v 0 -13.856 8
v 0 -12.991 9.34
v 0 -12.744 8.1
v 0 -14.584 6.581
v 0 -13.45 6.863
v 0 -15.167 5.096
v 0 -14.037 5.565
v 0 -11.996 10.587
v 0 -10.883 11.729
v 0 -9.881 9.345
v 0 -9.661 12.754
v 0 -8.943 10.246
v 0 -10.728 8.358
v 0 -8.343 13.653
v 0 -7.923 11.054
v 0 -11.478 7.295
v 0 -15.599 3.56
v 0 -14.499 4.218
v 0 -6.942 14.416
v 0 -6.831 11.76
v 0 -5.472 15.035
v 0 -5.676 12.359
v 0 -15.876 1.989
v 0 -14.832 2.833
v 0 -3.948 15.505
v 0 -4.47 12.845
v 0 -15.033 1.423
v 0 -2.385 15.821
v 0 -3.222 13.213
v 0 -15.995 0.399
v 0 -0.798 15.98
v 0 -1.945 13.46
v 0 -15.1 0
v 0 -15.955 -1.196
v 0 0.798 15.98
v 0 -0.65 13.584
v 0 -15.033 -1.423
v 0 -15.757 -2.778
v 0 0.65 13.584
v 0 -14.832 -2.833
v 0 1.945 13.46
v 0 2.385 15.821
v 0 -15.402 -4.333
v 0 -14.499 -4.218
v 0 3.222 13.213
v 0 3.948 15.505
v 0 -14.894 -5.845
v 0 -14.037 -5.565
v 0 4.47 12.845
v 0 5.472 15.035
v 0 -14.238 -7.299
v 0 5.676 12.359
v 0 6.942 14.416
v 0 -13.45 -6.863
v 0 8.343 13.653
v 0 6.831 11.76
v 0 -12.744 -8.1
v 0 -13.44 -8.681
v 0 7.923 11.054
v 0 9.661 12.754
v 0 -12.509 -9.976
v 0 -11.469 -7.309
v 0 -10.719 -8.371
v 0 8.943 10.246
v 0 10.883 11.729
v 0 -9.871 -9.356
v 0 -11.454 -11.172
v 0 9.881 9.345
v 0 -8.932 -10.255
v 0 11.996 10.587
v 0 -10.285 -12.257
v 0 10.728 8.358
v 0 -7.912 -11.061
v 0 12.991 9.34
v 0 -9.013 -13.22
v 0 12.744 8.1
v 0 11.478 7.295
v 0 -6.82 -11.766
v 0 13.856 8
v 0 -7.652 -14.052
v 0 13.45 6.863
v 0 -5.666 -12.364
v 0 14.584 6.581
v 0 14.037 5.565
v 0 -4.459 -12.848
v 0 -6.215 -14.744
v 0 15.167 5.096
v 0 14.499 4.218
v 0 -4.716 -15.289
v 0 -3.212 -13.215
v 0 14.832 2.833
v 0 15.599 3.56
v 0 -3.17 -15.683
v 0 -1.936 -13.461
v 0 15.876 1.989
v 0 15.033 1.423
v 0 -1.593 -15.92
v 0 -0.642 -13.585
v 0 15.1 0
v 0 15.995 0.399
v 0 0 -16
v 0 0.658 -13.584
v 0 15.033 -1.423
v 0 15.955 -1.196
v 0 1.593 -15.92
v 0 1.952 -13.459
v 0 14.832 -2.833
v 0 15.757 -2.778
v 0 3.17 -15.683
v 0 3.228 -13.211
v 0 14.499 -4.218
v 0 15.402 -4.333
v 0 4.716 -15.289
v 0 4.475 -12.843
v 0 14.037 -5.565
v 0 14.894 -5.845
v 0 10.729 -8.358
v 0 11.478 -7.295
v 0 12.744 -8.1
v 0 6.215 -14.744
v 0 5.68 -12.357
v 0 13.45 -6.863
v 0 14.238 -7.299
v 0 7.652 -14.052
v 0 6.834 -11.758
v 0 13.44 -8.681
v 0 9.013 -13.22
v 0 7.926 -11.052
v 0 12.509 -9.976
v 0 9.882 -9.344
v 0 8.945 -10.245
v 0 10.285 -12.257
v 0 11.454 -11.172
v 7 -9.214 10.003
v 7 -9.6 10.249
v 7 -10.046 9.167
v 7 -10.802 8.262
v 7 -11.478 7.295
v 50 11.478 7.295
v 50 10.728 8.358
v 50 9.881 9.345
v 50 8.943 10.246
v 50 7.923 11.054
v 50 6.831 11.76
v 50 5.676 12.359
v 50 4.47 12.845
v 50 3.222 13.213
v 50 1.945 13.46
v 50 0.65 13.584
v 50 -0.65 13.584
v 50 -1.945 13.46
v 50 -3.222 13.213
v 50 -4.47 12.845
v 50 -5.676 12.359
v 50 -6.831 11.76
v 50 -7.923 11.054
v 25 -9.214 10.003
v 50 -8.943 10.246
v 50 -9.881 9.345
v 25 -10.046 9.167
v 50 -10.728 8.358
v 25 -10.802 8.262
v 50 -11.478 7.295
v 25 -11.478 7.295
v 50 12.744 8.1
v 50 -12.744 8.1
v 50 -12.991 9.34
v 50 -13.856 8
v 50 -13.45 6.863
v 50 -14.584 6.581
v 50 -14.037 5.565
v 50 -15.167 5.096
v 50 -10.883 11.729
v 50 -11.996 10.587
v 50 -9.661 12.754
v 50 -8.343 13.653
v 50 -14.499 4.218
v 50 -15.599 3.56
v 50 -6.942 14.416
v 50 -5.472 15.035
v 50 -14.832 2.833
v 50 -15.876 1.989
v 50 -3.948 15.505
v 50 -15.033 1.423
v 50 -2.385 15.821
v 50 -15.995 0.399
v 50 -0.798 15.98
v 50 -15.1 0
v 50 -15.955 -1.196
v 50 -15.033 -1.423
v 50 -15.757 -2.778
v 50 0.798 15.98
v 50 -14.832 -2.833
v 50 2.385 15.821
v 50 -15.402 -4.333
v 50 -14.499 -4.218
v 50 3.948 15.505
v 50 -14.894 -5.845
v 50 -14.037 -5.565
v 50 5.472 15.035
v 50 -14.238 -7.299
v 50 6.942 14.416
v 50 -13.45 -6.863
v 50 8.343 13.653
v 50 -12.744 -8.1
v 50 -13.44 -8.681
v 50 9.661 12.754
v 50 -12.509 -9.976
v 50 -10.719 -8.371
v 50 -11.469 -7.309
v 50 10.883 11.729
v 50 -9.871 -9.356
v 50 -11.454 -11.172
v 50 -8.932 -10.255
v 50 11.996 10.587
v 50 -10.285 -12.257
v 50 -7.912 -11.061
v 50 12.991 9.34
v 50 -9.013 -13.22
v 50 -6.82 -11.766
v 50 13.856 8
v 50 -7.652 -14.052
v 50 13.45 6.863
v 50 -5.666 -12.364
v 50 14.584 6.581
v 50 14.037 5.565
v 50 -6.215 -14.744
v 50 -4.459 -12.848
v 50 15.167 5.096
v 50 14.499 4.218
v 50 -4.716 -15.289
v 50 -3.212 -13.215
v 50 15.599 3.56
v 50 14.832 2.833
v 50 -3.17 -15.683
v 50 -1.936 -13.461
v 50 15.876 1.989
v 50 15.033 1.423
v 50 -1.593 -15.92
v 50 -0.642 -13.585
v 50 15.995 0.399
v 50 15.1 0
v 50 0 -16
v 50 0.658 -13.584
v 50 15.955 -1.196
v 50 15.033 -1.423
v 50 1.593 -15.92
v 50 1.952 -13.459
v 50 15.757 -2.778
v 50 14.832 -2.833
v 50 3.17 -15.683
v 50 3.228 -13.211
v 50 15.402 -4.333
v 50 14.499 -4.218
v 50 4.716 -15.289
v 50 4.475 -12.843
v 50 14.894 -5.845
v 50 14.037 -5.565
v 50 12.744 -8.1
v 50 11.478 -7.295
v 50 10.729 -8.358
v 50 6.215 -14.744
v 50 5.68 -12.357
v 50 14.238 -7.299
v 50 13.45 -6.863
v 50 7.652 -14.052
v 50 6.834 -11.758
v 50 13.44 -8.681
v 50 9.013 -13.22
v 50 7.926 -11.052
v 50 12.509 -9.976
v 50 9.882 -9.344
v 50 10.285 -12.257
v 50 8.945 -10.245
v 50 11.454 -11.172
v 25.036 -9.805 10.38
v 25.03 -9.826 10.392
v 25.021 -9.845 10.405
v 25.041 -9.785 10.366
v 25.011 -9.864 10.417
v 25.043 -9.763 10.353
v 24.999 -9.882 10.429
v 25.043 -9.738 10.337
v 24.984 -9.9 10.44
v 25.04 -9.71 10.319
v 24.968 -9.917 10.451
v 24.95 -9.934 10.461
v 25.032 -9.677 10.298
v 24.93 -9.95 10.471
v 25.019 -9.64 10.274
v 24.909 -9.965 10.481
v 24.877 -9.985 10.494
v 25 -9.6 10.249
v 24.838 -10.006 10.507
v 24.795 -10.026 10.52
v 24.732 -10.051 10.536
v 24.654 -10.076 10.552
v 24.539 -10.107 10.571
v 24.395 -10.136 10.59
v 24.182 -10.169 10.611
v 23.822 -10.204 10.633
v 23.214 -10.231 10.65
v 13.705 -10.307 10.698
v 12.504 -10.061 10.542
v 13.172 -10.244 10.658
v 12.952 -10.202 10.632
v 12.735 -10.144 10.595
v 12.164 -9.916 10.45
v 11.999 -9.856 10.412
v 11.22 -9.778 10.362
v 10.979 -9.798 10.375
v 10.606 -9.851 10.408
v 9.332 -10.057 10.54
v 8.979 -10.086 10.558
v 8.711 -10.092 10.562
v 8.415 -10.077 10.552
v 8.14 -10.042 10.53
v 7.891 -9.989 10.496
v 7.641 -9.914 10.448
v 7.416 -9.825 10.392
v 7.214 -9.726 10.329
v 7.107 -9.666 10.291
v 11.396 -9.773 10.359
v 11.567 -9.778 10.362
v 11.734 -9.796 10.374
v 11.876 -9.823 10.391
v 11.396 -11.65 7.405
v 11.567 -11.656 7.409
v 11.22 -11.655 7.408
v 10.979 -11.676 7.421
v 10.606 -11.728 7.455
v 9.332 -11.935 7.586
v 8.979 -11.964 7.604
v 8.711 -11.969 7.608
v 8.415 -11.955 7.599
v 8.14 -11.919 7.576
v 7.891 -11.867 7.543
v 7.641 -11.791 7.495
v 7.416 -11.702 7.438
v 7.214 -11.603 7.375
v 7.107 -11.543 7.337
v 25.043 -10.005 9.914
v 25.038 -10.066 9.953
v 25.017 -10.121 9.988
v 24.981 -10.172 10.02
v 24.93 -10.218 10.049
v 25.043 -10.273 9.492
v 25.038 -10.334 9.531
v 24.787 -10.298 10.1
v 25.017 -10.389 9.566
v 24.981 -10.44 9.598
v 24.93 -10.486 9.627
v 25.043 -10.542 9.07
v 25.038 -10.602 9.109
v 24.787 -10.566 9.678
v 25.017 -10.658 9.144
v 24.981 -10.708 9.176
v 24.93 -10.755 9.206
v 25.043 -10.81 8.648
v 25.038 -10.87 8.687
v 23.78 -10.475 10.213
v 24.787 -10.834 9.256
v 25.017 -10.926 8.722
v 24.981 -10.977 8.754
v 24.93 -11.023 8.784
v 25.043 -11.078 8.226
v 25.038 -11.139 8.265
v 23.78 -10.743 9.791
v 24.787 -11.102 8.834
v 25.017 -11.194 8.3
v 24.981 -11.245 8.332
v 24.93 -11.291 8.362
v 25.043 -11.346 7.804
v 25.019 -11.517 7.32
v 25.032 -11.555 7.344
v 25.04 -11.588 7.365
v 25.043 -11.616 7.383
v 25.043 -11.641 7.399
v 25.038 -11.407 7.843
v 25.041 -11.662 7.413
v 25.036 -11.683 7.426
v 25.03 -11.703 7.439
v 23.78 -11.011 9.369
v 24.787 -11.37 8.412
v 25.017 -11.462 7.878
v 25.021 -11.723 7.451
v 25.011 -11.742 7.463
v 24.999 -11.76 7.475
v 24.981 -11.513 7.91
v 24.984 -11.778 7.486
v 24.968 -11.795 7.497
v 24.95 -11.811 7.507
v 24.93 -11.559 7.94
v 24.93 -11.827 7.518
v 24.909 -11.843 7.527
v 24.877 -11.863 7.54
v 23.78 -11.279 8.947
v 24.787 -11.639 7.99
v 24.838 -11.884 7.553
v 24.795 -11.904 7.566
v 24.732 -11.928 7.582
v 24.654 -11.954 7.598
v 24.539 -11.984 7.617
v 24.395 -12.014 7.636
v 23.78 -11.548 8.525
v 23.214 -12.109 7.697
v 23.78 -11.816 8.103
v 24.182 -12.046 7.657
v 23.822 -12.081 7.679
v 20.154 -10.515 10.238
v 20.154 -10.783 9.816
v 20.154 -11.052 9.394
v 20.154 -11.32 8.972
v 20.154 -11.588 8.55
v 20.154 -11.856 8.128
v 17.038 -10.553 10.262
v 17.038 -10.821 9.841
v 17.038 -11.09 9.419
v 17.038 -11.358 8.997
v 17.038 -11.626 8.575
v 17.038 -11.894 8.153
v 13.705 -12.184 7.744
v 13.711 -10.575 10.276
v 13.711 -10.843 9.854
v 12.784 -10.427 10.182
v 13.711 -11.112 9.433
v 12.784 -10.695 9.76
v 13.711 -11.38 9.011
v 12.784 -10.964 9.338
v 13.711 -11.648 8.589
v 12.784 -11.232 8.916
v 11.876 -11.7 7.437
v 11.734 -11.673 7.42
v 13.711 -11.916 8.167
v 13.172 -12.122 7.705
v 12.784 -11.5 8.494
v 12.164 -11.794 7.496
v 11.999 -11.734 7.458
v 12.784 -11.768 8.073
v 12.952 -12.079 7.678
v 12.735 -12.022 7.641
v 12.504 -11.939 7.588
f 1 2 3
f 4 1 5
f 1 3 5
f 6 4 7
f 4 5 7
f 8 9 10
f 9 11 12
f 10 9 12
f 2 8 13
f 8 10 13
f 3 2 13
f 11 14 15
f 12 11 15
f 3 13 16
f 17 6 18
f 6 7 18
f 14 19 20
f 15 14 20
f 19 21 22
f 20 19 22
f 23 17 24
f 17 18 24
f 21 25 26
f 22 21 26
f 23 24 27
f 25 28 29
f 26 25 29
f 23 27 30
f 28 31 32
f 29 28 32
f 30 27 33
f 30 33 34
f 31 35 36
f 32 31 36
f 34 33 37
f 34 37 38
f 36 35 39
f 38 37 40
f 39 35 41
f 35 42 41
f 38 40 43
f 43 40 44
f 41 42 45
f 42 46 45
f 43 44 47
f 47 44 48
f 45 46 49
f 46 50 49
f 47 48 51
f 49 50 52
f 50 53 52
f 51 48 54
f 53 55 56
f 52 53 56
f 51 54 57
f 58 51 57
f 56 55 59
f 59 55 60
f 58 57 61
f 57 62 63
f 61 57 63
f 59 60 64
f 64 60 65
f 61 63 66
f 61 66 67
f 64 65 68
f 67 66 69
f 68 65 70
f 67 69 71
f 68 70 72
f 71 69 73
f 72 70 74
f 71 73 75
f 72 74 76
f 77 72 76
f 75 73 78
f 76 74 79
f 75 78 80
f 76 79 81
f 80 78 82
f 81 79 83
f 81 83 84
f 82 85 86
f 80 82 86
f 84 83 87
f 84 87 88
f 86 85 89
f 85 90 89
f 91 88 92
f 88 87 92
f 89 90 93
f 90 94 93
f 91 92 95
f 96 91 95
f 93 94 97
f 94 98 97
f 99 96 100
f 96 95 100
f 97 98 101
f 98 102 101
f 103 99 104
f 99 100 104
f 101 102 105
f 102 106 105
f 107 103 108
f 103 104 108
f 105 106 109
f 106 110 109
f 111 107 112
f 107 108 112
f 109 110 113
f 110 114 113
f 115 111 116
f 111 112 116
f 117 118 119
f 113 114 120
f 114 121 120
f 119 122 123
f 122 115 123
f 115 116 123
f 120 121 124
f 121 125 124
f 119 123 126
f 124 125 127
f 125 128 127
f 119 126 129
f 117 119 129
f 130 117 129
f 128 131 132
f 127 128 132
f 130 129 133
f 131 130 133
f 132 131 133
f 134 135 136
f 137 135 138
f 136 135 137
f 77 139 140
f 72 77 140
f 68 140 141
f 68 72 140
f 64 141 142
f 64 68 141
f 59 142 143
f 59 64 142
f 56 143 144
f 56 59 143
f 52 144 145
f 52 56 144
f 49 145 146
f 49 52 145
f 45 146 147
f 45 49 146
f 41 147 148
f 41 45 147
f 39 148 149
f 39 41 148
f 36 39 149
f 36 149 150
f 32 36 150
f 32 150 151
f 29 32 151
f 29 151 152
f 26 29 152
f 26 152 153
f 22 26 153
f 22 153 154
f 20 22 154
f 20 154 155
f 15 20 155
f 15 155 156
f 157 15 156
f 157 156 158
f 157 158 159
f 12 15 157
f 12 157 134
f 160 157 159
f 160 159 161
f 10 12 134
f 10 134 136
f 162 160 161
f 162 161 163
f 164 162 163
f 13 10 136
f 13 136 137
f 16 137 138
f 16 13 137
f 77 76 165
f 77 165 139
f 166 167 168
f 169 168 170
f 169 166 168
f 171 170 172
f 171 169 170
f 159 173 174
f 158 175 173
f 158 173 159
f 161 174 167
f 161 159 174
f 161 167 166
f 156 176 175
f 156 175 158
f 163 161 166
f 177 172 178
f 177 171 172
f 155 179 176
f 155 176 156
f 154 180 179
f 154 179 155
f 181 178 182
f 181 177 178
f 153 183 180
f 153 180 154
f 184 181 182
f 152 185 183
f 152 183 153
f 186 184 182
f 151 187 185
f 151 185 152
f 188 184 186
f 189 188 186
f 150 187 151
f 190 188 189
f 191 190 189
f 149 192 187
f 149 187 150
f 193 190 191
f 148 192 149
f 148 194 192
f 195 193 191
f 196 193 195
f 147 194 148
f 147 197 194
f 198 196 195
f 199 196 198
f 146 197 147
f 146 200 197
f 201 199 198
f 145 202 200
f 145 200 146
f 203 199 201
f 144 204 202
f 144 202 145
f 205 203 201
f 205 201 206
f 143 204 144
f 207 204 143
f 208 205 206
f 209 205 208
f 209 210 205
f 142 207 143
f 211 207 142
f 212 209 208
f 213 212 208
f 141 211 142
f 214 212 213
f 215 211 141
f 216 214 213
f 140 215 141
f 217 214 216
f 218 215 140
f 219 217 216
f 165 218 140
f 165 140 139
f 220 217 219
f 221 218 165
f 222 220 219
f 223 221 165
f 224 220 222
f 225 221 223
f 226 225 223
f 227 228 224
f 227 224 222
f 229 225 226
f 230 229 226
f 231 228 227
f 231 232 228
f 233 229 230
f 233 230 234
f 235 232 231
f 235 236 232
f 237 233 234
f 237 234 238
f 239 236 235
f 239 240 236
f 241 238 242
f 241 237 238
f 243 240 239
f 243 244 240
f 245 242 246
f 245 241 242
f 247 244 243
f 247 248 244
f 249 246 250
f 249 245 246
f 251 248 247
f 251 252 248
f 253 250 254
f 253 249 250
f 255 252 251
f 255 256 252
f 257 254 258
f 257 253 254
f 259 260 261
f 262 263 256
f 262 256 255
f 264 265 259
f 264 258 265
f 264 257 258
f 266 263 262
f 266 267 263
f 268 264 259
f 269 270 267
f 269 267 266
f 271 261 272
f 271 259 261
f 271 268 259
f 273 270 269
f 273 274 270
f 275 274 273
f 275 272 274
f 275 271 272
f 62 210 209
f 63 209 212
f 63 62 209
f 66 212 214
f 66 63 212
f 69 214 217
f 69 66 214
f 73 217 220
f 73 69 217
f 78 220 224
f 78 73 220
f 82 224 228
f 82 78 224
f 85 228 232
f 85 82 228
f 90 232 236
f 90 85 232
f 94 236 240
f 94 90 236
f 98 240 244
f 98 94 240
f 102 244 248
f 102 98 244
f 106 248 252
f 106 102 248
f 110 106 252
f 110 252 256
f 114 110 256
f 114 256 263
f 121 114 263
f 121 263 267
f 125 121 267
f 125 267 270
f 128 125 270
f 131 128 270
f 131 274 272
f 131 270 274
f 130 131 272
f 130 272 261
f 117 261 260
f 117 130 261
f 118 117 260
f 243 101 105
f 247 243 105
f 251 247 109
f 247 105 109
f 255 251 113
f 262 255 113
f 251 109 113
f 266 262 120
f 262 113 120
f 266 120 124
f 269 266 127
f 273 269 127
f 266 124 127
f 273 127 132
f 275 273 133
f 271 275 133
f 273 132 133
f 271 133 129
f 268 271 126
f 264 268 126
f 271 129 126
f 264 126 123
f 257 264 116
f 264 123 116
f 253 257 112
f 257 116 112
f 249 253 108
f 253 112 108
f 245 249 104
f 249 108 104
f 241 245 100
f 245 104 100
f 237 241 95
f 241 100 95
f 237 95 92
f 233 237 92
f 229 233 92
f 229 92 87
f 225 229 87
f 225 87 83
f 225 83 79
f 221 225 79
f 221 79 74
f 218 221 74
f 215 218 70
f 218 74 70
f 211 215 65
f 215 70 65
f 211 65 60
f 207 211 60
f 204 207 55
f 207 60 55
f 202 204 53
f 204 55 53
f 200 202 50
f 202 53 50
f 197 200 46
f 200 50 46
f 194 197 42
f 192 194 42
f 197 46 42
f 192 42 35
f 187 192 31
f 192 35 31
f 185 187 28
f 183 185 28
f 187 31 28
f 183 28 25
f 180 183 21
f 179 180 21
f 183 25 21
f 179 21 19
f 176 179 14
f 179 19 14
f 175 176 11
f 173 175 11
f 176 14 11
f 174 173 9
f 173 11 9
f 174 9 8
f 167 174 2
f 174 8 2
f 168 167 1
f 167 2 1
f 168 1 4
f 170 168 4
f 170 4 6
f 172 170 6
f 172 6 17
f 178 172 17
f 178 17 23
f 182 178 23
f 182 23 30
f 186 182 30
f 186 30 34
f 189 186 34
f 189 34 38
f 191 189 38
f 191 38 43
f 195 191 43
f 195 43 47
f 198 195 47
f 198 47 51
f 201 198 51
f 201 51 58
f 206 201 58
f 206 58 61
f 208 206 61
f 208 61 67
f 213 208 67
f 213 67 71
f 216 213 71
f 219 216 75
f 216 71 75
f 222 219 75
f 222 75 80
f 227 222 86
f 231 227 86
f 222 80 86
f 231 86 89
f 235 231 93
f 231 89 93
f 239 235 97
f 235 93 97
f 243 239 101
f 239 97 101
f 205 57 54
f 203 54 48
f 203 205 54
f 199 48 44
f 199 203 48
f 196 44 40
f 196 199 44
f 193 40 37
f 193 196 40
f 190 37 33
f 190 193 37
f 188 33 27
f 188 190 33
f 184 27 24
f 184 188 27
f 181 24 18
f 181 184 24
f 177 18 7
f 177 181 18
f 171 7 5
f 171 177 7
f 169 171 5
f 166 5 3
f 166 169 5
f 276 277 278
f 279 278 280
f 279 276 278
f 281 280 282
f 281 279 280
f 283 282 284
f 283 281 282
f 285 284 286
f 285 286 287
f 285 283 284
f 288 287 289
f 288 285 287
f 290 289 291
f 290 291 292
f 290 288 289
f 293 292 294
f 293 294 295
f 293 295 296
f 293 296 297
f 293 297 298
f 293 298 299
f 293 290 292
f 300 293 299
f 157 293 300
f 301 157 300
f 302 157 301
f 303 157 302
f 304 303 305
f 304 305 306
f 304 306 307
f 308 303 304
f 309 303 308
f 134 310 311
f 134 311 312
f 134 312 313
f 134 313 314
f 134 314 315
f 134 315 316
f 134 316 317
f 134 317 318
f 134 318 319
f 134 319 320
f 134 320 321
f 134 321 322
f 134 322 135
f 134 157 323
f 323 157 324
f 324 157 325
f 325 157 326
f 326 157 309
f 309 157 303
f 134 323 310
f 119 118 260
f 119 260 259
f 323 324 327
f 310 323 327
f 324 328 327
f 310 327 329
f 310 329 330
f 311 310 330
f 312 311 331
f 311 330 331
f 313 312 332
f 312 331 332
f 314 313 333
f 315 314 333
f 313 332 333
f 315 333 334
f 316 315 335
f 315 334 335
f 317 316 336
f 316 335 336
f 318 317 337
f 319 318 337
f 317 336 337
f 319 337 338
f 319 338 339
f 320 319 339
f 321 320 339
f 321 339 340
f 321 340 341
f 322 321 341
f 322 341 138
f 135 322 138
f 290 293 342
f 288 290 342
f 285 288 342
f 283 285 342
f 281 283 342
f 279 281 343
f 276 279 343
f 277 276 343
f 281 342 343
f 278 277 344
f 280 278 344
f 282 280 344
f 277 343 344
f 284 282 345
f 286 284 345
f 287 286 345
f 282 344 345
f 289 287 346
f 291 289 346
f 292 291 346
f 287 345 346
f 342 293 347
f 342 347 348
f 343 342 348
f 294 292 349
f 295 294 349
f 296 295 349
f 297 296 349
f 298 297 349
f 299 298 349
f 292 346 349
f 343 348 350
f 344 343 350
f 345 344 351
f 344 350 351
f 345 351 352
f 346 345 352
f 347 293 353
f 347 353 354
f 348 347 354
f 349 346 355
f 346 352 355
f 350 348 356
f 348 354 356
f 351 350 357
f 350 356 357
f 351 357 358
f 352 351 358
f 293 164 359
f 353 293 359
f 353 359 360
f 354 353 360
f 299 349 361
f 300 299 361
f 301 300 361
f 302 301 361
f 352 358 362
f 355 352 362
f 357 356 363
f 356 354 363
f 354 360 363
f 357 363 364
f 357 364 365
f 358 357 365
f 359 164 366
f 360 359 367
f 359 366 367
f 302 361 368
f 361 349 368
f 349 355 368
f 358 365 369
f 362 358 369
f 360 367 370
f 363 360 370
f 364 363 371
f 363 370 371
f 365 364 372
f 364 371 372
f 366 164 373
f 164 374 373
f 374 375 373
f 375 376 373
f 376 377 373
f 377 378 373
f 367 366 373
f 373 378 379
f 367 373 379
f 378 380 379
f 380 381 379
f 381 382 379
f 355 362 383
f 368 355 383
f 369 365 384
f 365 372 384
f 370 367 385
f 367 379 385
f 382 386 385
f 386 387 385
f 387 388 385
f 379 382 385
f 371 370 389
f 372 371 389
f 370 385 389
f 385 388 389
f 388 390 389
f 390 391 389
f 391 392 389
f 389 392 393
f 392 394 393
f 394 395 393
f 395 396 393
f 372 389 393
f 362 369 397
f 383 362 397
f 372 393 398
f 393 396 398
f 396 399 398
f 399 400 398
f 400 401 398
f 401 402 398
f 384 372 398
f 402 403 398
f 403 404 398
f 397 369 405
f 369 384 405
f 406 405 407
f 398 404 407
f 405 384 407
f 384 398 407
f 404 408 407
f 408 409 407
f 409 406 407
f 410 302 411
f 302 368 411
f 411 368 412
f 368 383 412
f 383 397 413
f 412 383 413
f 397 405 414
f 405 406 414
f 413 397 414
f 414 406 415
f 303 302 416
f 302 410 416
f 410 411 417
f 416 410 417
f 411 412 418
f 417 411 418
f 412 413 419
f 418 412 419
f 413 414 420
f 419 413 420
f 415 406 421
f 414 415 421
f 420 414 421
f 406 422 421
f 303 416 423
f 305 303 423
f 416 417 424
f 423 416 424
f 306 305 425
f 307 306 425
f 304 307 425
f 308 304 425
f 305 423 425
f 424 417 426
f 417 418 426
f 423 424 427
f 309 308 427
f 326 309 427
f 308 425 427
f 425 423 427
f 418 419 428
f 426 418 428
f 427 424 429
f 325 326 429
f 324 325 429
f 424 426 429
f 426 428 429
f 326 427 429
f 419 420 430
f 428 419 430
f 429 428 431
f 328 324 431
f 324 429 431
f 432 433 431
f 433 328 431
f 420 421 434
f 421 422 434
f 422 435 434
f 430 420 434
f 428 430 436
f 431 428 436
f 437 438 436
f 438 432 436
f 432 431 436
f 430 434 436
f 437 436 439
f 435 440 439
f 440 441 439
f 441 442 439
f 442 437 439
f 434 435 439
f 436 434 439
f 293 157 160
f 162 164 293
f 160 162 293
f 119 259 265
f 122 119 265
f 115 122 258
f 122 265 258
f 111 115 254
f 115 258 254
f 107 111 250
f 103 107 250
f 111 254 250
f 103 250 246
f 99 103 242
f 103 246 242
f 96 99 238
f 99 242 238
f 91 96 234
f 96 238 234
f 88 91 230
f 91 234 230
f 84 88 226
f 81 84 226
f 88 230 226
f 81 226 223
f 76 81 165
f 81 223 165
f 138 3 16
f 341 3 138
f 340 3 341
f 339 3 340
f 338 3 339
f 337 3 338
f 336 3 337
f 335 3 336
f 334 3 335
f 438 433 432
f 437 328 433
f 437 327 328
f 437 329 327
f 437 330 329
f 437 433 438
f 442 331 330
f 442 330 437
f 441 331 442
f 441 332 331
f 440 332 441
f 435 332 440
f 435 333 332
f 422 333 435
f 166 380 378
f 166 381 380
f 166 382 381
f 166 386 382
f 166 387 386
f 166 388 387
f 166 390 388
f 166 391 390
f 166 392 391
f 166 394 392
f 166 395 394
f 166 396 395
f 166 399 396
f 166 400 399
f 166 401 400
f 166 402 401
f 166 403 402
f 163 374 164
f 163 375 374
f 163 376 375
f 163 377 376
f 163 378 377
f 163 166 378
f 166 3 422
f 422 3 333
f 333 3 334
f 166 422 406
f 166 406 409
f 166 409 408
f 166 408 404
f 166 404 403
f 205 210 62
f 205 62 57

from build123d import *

# Parameters (mm, degrees)
SKETCH1_R           = 16
SKETCH1_R_2         = 13.6
BOSS_EXTRUDE1_DEPTH = 50
CUT_EXTRUDE1_DEPTH  = 55.881690936
CUT_EXTRUDE2_DEPTH  = 3.5


with BuildPart() as part:
    # Sketch1 → Boss-Extrude1 (new body)
    with BuildSketch(Plane(origin=(0, 0, 0), x_dir=(0, 0, -1), z_dir=(1, 0, 0))):
        Circle(SKETCH1_R)
        Circle(SKETCH1_R_2, mode=Mode.SUBTRACT)
    extrude(amount=BOSS_EXTRUDE1_DEPTH)

    # Sketch2 → Cut-Extrude1 (cut, through all)
    with BuildSketch(Plane(origin=(50, 0, 0), x_dir=(0, 0, -1), z_dir=(1, 0, 0))):
        with BuildLine():
            Line((-8.1, 12.743625858), (-7.295364238, 11.477702759))
            ThreePointArc((-7.295364238, 11.477702759), (0, 13.6), (7.295364238, 11.477702759))
            Line((7.295364238, 11.477702759), (8.1, 12.743625858))
            ThreePointArc((8.1, 12.743625858), (0, 15.1), (-8.1, 12.743625858))
        make_face()
        with BuildLine():
            Line((-8.1, -12.743625858), (-7.295364238, -11.477702759))
            ThreePointArc((-7.295364238, -11.477702759), (0.008056302, -13.599997614), (7.308957327, -11.469051521))
            Line((7.308957327, -11.469051521), (8.1, -12.743625858))
            ThreePointArc((8.1, -12.743625858), (0, -15.1), (-8.1, -12.743625858))
        make_face()
    extrude(amount=-CUT_EXTRUDE1_DEPTH, mode=Mode.SUBTRACT)

    # Sketch3 → Cut-Extrude2 (cut)
    with BuildSketch(Plane(origin=(0, 0, 0), x_dir=(-1, 0, 0), z_dir=(0, -0.5364238410596023, -0.8439487322953112))):
        with BuildLine():
            Line((-7, -13.6), (-7, -12.445895529))
            Line((-7, -12.445895529), (-25, -12.445895529))
            Line((-25, -12.445895529), (-25, -13.6))
            add(Edge.make_bspline(
                [(-25, -13.6), (-25.419648133, -14.53323317), (-22.215303237, -14.299464122), (-19.182889181, -14.398286796), (-18.428629005, -14.414668585), (-16.283931227, -14.396819072), (-13.186228061, -14.668811806), (-11.028088937, -13.12651294), (-8.819150609, -14.976468108), (-7, -13.6)],
                knots=[0, 0, 0, 0, 0.204097014, 0.238608821, 0.396578619, 0.439763334, 0.627271258, 0.685638773, 1, 1, 1, 1], degree=3))
        make_face()
    extrude(amount=-CUT_EXTRUDE2_DEPTH, mode=Mode.SUBTRACT)


solid = part.part
